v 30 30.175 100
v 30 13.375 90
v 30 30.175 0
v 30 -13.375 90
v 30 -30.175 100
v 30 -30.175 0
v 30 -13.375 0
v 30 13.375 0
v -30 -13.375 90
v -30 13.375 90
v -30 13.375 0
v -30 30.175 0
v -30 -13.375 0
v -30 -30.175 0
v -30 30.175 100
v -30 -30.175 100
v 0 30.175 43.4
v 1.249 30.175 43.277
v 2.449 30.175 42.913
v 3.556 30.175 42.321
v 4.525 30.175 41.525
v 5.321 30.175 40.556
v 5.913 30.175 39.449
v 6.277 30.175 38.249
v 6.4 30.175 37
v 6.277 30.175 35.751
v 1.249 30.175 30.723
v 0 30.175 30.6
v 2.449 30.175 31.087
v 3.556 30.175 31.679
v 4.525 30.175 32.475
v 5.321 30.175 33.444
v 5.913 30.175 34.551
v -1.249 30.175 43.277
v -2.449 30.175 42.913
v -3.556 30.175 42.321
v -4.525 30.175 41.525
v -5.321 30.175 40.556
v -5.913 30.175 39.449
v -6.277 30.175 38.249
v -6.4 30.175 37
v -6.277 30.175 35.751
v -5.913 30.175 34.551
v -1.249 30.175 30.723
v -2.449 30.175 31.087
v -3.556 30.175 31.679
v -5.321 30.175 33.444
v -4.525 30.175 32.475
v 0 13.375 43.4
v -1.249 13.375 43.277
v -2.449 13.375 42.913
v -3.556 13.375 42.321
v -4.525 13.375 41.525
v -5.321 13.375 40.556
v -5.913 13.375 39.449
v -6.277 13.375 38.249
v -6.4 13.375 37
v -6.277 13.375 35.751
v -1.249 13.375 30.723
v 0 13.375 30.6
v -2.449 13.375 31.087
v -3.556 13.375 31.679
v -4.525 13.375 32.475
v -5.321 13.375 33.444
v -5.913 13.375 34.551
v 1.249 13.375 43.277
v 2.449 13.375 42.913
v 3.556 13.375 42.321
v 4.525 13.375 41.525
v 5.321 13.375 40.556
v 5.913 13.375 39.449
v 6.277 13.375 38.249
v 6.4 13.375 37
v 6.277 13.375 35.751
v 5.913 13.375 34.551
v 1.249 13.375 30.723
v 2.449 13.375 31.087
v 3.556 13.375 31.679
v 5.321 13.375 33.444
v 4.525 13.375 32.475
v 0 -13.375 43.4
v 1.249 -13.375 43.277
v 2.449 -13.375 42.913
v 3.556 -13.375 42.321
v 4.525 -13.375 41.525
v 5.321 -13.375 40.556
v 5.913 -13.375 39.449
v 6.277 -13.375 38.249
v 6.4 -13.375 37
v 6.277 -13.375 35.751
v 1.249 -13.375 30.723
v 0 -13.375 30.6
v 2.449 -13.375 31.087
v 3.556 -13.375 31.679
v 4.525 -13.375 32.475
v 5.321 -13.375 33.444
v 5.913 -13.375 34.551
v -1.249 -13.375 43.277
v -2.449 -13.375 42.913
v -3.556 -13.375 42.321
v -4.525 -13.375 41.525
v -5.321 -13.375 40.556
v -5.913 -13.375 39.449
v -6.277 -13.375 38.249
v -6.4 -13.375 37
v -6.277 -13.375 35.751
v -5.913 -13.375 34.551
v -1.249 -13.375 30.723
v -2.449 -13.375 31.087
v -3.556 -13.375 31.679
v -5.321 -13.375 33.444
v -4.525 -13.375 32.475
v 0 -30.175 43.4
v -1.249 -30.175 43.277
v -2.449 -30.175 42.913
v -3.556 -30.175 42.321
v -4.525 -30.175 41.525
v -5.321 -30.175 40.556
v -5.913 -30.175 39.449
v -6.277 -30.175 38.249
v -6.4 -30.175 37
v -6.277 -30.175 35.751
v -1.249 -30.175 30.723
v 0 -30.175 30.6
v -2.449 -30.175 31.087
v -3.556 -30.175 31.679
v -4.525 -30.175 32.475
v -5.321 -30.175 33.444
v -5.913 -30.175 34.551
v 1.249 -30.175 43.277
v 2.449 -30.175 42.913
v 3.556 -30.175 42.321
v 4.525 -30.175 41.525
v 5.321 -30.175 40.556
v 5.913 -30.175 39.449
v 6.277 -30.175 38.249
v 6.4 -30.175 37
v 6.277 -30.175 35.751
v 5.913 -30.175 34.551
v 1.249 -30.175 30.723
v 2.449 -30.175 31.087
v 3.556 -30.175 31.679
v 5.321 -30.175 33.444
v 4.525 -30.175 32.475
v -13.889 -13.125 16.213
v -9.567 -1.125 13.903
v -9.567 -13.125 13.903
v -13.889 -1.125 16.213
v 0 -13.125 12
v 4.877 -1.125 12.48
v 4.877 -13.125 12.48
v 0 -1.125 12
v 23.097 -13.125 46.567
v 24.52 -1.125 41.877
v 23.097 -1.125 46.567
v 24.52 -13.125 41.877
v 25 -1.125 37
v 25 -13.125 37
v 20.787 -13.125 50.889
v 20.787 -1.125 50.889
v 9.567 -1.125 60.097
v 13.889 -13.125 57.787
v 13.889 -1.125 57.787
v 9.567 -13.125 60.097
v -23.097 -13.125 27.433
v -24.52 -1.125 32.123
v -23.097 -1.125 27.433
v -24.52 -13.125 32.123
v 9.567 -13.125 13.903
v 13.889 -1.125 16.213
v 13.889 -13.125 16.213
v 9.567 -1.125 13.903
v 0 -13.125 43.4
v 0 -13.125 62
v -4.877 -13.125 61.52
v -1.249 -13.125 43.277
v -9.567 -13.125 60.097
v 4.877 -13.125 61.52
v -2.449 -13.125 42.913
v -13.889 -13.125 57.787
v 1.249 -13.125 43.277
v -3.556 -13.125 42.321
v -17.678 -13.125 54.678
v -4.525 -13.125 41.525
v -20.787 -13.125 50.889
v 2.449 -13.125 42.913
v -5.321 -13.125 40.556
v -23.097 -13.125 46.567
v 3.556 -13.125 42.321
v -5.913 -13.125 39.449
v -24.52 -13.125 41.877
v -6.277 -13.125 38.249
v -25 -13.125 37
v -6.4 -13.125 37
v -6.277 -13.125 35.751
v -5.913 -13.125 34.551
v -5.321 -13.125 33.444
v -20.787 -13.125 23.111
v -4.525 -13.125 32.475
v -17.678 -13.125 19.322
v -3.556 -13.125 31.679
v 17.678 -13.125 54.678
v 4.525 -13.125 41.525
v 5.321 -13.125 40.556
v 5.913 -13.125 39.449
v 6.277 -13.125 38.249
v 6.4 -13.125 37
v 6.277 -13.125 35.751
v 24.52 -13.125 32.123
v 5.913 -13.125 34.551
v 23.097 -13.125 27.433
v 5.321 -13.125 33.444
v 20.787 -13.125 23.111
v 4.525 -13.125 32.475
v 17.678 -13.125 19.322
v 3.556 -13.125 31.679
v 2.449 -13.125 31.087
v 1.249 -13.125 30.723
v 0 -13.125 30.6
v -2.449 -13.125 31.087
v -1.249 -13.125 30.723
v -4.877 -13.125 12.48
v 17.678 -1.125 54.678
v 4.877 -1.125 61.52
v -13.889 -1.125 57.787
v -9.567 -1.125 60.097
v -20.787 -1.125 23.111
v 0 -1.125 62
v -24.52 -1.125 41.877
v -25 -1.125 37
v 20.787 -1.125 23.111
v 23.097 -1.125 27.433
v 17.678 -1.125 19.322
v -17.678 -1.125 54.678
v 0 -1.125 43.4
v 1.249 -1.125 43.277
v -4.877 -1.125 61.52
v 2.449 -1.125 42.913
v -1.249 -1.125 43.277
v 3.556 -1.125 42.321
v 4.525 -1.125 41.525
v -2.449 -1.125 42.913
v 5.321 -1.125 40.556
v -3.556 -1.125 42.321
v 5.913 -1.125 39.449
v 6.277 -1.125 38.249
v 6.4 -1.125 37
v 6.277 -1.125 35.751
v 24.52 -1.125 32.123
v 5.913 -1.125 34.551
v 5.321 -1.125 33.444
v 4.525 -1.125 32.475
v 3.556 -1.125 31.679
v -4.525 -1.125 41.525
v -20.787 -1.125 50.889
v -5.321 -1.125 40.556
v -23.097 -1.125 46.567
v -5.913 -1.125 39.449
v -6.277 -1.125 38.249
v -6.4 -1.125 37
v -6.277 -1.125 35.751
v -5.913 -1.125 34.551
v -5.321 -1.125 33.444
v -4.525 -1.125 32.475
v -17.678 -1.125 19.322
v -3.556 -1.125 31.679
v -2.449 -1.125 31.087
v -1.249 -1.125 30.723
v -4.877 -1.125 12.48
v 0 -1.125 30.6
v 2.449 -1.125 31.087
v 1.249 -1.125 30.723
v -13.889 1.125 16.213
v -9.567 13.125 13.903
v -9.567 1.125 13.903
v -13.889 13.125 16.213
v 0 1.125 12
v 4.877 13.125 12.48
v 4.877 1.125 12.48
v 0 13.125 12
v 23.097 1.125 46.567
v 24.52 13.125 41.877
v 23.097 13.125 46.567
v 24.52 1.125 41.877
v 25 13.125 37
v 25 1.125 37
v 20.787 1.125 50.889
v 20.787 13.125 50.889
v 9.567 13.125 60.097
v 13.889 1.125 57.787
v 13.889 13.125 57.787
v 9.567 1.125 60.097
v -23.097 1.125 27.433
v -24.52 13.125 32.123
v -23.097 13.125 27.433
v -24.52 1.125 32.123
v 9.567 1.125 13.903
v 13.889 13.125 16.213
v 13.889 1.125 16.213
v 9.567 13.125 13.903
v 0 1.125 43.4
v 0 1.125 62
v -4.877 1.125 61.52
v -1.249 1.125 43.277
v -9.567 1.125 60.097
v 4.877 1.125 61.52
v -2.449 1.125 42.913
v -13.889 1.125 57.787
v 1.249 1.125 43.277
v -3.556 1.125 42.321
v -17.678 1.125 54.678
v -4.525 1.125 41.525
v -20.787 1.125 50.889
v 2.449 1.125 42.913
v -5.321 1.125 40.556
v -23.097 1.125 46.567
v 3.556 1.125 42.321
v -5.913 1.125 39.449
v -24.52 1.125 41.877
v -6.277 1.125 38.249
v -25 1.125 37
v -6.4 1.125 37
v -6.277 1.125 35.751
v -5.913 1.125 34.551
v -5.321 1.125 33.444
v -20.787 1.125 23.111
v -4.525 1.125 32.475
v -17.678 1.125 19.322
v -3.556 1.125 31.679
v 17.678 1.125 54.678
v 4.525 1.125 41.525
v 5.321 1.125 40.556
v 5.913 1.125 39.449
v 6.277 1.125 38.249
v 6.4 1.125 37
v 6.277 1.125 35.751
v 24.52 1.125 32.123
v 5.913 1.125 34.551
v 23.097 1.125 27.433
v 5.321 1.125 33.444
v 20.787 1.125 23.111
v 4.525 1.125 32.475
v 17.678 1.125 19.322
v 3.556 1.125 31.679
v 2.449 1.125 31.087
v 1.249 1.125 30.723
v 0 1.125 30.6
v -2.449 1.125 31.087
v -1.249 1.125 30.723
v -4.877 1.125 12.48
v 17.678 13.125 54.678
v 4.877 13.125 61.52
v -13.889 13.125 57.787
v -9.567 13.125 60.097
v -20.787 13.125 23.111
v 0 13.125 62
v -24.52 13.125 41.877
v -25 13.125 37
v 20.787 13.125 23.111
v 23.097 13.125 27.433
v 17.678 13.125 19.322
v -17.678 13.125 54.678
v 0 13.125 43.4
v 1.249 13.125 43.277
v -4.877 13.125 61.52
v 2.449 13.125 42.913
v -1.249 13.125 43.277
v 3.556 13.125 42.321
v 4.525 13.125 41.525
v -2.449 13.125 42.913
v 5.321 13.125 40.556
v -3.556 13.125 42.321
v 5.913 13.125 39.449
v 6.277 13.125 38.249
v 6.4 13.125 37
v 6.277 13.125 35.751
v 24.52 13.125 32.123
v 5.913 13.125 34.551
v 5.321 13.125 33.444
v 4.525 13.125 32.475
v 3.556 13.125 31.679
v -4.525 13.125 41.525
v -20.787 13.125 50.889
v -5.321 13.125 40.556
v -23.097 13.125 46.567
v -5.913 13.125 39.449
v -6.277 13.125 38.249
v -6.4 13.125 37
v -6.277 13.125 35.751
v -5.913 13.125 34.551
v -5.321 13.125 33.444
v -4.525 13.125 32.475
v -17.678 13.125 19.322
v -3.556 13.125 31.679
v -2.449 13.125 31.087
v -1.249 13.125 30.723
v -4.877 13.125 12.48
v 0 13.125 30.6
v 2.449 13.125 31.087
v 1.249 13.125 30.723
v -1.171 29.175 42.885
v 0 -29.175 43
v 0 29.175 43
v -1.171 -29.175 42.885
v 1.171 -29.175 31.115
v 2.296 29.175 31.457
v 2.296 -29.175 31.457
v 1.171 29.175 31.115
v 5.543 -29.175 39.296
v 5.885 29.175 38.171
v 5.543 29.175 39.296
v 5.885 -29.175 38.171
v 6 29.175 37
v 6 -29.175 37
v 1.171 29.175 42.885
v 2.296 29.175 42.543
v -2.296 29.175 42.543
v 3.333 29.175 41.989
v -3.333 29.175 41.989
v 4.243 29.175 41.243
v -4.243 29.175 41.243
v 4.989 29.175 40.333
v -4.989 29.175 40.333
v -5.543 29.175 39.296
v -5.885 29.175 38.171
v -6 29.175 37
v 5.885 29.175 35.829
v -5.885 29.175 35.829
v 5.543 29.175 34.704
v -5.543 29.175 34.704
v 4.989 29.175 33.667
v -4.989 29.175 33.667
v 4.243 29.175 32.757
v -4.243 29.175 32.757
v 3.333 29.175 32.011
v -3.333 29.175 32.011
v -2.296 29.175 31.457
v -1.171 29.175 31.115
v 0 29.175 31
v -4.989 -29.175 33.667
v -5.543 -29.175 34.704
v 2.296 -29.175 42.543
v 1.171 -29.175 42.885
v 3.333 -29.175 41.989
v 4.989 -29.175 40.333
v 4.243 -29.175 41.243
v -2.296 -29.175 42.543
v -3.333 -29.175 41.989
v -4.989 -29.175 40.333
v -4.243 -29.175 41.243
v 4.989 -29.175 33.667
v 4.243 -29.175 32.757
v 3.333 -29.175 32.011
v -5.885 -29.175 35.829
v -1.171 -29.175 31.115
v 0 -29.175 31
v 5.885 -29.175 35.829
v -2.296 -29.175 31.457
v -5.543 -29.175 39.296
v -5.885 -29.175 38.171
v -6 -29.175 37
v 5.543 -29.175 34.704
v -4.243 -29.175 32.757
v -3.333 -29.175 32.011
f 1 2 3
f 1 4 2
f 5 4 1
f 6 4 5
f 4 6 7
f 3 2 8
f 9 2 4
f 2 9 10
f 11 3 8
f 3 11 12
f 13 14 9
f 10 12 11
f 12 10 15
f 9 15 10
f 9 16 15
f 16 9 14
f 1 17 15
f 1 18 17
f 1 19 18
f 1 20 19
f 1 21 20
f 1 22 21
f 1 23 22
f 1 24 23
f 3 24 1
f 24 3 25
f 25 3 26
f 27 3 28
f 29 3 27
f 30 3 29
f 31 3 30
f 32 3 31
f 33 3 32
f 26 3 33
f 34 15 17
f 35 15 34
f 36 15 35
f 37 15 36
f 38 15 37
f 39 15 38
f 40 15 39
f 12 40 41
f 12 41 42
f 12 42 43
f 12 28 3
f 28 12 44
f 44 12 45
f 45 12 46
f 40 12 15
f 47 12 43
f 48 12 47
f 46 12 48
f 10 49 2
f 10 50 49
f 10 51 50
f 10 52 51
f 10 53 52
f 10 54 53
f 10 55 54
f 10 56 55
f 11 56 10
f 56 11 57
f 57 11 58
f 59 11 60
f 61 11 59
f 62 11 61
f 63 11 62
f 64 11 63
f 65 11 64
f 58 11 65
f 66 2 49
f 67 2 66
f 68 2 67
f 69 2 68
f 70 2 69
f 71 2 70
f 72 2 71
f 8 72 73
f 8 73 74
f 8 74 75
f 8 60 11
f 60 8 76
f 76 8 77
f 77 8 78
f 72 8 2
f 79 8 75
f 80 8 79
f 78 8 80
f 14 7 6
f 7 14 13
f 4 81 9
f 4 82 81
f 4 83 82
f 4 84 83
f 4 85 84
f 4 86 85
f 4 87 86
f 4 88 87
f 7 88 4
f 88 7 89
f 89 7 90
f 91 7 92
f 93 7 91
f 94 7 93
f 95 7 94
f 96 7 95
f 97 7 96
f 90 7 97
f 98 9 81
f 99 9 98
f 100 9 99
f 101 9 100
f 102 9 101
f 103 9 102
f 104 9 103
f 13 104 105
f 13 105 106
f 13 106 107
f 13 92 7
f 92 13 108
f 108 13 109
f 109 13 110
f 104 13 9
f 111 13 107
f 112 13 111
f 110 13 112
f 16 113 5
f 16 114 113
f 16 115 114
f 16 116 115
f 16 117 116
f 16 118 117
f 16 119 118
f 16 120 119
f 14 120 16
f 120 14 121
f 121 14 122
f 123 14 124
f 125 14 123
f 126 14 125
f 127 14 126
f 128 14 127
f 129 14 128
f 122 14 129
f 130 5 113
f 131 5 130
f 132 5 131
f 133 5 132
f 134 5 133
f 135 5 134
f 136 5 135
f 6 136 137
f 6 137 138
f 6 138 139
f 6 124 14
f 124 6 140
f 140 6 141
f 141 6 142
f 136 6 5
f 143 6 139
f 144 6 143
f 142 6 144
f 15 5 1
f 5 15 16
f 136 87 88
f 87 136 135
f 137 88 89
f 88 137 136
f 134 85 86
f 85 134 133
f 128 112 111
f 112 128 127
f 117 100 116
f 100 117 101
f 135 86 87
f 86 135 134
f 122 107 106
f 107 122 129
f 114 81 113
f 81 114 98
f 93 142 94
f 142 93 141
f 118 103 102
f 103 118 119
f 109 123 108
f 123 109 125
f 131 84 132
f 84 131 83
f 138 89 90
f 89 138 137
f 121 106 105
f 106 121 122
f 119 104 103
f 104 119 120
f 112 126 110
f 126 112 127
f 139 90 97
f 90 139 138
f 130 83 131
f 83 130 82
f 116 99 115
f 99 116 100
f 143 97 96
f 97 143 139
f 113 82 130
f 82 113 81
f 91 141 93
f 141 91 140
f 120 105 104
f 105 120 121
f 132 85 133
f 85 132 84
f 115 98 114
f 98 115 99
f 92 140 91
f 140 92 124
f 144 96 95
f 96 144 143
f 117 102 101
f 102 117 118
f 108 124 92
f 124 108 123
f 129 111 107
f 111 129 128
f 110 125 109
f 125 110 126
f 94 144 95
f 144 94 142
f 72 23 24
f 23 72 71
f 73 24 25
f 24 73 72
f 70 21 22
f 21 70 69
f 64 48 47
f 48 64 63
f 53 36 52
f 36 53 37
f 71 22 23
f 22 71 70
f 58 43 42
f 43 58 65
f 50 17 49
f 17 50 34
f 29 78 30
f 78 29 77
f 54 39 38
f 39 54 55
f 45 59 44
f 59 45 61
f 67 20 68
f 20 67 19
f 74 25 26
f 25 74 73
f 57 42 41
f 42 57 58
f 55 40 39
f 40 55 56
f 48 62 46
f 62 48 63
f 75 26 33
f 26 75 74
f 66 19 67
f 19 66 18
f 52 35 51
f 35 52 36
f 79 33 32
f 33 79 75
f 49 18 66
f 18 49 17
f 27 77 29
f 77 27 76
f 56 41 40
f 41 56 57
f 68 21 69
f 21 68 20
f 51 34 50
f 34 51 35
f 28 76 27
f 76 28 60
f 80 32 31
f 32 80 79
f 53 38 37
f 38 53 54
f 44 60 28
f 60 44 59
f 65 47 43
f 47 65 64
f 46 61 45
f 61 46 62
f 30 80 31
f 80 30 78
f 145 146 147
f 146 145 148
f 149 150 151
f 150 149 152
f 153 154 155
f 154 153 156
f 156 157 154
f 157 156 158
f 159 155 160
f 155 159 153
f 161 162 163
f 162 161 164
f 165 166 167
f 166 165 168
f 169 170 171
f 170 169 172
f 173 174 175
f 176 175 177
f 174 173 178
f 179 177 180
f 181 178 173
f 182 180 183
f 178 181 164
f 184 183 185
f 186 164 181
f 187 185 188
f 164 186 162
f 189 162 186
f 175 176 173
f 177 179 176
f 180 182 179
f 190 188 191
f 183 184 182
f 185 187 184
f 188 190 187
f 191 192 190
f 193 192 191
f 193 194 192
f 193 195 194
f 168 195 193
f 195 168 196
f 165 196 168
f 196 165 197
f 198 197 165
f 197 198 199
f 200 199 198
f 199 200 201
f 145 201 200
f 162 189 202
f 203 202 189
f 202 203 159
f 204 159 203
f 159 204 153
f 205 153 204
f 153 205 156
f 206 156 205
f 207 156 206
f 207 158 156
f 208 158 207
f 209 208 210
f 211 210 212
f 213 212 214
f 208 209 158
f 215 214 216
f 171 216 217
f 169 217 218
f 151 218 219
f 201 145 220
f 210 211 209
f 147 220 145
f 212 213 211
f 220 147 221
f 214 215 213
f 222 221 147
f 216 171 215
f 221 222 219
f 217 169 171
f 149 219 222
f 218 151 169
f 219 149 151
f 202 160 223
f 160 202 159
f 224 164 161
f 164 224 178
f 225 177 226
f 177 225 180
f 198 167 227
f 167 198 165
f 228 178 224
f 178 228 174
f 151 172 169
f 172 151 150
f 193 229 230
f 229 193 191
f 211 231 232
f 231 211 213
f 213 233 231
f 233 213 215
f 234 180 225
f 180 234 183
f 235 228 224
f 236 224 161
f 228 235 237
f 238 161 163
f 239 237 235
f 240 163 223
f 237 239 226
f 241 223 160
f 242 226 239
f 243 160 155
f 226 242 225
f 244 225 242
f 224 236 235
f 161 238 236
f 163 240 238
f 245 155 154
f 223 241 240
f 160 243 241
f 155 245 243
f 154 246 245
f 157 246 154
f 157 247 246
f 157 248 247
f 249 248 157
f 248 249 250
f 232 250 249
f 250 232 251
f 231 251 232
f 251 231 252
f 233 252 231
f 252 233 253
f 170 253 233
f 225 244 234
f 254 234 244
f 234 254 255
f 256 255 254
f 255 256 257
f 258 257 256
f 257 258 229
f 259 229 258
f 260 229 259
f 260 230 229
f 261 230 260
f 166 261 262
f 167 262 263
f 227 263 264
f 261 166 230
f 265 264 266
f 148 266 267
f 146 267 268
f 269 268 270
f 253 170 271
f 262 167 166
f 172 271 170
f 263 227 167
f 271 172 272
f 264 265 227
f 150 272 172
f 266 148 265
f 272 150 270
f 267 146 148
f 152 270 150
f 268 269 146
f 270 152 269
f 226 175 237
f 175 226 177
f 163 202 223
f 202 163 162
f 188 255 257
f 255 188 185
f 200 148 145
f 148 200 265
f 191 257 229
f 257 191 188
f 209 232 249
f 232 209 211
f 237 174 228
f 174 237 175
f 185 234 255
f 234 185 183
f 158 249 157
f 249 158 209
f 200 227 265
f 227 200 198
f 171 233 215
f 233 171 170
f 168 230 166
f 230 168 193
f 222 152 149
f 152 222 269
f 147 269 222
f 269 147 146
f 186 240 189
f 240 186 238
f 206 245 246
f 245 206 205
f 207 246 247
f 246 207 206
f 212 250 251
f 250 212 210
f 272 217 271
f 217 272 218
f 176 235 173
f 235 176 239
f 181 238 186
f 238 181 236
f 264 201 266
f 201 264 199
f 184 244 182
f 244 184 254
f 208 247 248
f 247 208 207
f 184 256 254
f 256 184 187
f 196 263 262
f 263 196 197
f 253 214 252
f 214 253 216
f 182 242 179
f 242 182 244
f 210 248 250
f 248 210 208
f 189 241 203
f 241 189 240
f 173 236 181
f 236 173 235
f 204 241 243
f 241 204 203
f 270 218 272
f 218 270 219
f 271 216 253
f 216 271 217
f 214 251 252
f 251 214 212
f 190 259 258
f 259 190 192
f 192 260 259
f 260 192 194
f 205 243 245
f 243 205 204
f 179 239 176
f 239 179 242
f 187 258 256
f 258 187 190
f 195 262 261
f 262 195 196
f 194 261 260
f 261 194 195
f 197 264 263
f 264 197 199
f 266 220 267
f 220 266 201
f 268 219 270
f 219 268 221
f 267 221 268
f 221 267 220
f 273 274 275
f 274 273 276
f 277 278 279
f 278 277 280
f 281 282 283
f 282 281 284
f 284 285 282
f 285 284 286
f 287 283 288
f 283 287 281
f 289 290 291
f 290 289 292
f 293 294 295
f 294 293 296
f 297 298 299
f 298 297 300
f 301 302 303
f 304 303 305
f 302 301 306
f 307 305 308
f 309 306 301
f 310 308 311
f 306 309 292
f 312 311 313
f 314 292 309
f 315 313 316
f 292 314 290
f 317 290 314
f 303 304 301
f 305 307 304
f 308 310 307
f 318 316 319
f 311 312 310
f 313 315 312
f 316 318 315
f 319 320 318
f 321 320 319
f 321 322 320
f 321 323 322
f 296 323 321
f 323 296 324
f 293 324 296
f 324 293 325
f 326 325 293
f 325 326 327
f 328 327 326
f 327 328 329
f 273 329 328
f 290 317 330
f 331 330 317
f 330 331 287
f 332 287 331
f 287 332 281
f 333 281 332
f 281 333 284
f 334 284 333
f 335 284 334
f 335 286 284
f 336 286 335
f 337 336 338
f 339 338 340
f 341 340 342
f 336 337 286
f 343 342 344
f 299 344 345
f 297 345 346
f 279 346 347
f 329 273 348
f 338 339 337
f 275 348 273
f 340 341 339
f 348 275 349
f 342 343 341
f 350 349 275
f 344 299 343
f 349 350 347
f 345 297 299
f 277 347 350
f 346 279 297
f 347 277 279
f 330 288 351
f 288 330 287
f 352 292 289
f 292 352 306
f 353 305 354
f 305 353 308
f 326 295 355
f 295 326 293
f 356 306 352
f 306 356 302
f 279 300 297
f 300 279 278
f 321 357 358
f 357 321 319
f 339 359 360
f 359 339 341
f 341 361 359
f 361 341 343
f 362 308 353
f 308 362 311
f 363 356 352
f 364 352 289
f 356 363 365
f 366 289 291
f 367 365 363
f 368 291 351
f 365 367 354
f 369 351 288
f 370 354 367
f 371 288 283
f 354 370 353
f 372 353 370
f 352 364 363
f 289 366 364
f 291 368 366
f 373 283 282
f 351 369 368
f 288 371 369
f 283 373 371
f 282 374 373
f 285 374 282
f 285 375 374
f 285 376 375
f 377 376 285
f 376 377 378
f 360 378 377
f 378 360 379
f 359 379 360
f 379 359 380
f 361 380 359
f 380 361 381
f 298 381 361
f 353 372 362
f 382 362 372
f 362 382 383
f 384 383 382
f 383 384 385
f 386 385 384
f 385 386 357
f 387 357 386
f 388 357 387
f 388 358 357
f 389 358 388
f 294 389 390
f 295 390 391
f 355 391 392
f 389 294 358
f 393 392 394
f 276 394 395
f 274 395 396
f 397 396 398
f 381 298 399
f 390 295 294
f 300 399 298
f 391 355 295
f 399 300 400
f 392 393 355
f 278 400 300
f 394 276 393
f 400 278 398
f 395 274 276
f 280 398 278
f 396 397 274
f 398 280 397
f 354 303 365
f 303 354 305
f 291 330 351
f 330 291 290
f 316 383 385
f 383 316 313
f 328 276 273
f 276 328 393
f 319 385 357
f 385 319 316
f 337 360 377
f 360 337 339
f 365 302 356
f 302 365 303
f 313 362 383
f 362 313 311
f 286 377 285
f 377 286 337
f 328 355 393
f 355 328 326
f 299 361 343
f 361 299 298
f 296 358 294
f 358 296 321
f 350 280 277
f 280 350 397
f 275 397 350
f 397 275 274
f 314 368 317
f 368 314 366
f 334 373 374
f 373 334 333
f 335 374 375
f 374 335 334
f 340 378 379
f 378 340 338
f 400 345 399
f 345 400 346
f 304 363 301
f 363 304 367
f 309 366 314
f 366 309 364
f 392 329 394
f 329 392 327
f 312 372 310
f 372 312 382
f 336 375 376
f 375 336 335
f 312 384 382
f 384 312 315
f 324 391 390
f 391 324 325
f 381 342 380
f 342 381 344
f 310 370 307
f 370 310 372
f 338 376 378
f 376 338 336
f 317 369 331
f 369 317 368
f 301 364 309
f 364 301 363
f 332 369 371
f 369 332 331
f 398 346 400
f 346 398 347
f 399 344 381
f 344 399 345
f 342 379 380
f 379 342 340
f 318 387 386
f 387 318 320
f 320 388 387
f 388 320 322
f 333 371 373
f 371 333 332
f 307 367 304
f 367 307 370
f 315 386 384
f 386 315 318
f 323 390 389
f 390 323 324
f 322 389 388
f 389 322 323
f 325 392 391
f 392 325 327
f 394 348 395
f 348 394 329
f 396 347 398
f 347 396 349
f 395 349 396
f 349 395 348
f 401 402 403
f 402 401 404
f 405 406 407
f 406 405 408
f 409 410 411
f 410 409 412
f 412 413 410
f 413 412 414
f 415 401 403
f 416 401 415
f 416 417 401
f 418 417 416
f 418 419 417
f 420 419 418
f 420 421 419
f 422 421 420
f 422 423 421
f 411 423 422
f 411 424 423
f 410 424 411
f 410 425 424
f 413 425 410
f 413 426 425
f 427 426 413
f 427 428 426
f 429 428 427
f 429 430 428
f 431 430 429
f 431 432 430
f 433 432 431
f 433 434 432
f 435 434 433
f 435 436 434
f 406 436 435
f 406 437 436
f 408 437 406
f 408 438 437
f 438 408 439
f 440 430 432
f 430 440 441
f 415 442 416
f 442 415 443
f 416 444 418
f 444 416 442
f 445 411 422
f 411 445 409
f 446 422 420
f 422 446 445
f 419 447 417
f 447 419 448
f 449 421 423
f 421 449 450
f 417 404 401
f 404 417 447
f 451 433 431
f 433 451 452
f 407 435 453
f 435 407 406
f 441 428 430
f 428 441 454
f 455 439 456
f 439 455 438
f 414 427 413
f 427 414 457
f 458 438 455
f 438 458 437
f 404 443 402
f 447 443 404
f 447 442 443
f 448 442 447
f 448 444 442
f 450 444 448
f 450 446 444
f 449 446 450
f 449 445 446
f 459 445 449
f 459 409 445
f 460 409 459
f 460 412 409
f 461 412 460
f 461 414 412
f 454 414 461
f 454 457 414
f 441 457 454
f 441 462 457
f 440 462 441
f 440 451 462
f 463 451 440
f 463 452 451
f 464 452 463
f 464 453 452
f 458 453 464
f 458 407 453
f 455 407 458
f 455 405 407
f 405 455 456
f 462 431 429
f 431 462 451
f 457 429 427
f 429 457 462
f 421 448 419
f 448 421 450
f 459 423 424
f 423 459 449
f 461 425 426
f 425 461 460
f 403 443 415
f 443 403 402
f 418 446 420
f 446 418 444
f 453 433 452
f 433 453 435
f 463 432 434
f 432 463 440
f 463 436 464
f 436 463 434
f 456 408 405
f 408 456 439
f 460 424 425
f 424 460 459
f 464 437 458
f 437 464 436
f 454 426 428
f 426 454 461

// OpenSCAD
$fn = 32;

// ------------------------------------------------------------------------
// Trolley wheel set: wheels d50, fork 90 mm tall
// Every part is its own module, assembly() places every instance.
// ------------------------------------------------------------------------

// --- part 1 ---
module trolley_fork() {
  difference() {
    union() {
      translate([-30, 13.375, 0]) cube([60, 16.8, 90]);
      translate([-30, -30.175, 0]) cube([60, 16.8, 90]);
      translate([-30, -30.175, 90]) cube([60, 60.35, 10]);
    }
    translate([0, -21.775, 37]) rotate([90, 0, 0]) cylinder(h = 18.8, d = 12.8, center = true);
    translate([0, 21.775, 37]) rotate([90, 0, 0]) cylinder(h = 18.8, d = 12.8, center = true);
  }
}

// --- part 2 ---
module trolley_wheel() {
  difference() {
      translate([0, 0, 0]) cylinder(h = 12, d = 50);
      translate([0, 0, -1]) cylinder(h = 14, d = 12.8);
    }
}

// --- part 3 ---
module trolley_axle() {
  translate([0, 0, -29.175]) cylinder(h = 58.35, d = 12);
}

// --- assembly ---
module assembly() {
  color([0.80, 0.24, 0.20]) translate([0, 0, 0]) rotate([0, 0, 0]) trolley_fork();
  color([0.20, 0.45, 0.75]) translate([0, -1.125, 37]) rotate([90, 0, 0]) trolley_wheel();
  color([0.25, 0.62, 0.32]) translate([0, 13.125, 37]) rotate([90, 0, 0]) trolley_wheel();
  color([0.92, 0.70, 0.18]) translate([0, 0, 37]) rotate([90, 0, 0]) trolley_axle();
}

assembly();
